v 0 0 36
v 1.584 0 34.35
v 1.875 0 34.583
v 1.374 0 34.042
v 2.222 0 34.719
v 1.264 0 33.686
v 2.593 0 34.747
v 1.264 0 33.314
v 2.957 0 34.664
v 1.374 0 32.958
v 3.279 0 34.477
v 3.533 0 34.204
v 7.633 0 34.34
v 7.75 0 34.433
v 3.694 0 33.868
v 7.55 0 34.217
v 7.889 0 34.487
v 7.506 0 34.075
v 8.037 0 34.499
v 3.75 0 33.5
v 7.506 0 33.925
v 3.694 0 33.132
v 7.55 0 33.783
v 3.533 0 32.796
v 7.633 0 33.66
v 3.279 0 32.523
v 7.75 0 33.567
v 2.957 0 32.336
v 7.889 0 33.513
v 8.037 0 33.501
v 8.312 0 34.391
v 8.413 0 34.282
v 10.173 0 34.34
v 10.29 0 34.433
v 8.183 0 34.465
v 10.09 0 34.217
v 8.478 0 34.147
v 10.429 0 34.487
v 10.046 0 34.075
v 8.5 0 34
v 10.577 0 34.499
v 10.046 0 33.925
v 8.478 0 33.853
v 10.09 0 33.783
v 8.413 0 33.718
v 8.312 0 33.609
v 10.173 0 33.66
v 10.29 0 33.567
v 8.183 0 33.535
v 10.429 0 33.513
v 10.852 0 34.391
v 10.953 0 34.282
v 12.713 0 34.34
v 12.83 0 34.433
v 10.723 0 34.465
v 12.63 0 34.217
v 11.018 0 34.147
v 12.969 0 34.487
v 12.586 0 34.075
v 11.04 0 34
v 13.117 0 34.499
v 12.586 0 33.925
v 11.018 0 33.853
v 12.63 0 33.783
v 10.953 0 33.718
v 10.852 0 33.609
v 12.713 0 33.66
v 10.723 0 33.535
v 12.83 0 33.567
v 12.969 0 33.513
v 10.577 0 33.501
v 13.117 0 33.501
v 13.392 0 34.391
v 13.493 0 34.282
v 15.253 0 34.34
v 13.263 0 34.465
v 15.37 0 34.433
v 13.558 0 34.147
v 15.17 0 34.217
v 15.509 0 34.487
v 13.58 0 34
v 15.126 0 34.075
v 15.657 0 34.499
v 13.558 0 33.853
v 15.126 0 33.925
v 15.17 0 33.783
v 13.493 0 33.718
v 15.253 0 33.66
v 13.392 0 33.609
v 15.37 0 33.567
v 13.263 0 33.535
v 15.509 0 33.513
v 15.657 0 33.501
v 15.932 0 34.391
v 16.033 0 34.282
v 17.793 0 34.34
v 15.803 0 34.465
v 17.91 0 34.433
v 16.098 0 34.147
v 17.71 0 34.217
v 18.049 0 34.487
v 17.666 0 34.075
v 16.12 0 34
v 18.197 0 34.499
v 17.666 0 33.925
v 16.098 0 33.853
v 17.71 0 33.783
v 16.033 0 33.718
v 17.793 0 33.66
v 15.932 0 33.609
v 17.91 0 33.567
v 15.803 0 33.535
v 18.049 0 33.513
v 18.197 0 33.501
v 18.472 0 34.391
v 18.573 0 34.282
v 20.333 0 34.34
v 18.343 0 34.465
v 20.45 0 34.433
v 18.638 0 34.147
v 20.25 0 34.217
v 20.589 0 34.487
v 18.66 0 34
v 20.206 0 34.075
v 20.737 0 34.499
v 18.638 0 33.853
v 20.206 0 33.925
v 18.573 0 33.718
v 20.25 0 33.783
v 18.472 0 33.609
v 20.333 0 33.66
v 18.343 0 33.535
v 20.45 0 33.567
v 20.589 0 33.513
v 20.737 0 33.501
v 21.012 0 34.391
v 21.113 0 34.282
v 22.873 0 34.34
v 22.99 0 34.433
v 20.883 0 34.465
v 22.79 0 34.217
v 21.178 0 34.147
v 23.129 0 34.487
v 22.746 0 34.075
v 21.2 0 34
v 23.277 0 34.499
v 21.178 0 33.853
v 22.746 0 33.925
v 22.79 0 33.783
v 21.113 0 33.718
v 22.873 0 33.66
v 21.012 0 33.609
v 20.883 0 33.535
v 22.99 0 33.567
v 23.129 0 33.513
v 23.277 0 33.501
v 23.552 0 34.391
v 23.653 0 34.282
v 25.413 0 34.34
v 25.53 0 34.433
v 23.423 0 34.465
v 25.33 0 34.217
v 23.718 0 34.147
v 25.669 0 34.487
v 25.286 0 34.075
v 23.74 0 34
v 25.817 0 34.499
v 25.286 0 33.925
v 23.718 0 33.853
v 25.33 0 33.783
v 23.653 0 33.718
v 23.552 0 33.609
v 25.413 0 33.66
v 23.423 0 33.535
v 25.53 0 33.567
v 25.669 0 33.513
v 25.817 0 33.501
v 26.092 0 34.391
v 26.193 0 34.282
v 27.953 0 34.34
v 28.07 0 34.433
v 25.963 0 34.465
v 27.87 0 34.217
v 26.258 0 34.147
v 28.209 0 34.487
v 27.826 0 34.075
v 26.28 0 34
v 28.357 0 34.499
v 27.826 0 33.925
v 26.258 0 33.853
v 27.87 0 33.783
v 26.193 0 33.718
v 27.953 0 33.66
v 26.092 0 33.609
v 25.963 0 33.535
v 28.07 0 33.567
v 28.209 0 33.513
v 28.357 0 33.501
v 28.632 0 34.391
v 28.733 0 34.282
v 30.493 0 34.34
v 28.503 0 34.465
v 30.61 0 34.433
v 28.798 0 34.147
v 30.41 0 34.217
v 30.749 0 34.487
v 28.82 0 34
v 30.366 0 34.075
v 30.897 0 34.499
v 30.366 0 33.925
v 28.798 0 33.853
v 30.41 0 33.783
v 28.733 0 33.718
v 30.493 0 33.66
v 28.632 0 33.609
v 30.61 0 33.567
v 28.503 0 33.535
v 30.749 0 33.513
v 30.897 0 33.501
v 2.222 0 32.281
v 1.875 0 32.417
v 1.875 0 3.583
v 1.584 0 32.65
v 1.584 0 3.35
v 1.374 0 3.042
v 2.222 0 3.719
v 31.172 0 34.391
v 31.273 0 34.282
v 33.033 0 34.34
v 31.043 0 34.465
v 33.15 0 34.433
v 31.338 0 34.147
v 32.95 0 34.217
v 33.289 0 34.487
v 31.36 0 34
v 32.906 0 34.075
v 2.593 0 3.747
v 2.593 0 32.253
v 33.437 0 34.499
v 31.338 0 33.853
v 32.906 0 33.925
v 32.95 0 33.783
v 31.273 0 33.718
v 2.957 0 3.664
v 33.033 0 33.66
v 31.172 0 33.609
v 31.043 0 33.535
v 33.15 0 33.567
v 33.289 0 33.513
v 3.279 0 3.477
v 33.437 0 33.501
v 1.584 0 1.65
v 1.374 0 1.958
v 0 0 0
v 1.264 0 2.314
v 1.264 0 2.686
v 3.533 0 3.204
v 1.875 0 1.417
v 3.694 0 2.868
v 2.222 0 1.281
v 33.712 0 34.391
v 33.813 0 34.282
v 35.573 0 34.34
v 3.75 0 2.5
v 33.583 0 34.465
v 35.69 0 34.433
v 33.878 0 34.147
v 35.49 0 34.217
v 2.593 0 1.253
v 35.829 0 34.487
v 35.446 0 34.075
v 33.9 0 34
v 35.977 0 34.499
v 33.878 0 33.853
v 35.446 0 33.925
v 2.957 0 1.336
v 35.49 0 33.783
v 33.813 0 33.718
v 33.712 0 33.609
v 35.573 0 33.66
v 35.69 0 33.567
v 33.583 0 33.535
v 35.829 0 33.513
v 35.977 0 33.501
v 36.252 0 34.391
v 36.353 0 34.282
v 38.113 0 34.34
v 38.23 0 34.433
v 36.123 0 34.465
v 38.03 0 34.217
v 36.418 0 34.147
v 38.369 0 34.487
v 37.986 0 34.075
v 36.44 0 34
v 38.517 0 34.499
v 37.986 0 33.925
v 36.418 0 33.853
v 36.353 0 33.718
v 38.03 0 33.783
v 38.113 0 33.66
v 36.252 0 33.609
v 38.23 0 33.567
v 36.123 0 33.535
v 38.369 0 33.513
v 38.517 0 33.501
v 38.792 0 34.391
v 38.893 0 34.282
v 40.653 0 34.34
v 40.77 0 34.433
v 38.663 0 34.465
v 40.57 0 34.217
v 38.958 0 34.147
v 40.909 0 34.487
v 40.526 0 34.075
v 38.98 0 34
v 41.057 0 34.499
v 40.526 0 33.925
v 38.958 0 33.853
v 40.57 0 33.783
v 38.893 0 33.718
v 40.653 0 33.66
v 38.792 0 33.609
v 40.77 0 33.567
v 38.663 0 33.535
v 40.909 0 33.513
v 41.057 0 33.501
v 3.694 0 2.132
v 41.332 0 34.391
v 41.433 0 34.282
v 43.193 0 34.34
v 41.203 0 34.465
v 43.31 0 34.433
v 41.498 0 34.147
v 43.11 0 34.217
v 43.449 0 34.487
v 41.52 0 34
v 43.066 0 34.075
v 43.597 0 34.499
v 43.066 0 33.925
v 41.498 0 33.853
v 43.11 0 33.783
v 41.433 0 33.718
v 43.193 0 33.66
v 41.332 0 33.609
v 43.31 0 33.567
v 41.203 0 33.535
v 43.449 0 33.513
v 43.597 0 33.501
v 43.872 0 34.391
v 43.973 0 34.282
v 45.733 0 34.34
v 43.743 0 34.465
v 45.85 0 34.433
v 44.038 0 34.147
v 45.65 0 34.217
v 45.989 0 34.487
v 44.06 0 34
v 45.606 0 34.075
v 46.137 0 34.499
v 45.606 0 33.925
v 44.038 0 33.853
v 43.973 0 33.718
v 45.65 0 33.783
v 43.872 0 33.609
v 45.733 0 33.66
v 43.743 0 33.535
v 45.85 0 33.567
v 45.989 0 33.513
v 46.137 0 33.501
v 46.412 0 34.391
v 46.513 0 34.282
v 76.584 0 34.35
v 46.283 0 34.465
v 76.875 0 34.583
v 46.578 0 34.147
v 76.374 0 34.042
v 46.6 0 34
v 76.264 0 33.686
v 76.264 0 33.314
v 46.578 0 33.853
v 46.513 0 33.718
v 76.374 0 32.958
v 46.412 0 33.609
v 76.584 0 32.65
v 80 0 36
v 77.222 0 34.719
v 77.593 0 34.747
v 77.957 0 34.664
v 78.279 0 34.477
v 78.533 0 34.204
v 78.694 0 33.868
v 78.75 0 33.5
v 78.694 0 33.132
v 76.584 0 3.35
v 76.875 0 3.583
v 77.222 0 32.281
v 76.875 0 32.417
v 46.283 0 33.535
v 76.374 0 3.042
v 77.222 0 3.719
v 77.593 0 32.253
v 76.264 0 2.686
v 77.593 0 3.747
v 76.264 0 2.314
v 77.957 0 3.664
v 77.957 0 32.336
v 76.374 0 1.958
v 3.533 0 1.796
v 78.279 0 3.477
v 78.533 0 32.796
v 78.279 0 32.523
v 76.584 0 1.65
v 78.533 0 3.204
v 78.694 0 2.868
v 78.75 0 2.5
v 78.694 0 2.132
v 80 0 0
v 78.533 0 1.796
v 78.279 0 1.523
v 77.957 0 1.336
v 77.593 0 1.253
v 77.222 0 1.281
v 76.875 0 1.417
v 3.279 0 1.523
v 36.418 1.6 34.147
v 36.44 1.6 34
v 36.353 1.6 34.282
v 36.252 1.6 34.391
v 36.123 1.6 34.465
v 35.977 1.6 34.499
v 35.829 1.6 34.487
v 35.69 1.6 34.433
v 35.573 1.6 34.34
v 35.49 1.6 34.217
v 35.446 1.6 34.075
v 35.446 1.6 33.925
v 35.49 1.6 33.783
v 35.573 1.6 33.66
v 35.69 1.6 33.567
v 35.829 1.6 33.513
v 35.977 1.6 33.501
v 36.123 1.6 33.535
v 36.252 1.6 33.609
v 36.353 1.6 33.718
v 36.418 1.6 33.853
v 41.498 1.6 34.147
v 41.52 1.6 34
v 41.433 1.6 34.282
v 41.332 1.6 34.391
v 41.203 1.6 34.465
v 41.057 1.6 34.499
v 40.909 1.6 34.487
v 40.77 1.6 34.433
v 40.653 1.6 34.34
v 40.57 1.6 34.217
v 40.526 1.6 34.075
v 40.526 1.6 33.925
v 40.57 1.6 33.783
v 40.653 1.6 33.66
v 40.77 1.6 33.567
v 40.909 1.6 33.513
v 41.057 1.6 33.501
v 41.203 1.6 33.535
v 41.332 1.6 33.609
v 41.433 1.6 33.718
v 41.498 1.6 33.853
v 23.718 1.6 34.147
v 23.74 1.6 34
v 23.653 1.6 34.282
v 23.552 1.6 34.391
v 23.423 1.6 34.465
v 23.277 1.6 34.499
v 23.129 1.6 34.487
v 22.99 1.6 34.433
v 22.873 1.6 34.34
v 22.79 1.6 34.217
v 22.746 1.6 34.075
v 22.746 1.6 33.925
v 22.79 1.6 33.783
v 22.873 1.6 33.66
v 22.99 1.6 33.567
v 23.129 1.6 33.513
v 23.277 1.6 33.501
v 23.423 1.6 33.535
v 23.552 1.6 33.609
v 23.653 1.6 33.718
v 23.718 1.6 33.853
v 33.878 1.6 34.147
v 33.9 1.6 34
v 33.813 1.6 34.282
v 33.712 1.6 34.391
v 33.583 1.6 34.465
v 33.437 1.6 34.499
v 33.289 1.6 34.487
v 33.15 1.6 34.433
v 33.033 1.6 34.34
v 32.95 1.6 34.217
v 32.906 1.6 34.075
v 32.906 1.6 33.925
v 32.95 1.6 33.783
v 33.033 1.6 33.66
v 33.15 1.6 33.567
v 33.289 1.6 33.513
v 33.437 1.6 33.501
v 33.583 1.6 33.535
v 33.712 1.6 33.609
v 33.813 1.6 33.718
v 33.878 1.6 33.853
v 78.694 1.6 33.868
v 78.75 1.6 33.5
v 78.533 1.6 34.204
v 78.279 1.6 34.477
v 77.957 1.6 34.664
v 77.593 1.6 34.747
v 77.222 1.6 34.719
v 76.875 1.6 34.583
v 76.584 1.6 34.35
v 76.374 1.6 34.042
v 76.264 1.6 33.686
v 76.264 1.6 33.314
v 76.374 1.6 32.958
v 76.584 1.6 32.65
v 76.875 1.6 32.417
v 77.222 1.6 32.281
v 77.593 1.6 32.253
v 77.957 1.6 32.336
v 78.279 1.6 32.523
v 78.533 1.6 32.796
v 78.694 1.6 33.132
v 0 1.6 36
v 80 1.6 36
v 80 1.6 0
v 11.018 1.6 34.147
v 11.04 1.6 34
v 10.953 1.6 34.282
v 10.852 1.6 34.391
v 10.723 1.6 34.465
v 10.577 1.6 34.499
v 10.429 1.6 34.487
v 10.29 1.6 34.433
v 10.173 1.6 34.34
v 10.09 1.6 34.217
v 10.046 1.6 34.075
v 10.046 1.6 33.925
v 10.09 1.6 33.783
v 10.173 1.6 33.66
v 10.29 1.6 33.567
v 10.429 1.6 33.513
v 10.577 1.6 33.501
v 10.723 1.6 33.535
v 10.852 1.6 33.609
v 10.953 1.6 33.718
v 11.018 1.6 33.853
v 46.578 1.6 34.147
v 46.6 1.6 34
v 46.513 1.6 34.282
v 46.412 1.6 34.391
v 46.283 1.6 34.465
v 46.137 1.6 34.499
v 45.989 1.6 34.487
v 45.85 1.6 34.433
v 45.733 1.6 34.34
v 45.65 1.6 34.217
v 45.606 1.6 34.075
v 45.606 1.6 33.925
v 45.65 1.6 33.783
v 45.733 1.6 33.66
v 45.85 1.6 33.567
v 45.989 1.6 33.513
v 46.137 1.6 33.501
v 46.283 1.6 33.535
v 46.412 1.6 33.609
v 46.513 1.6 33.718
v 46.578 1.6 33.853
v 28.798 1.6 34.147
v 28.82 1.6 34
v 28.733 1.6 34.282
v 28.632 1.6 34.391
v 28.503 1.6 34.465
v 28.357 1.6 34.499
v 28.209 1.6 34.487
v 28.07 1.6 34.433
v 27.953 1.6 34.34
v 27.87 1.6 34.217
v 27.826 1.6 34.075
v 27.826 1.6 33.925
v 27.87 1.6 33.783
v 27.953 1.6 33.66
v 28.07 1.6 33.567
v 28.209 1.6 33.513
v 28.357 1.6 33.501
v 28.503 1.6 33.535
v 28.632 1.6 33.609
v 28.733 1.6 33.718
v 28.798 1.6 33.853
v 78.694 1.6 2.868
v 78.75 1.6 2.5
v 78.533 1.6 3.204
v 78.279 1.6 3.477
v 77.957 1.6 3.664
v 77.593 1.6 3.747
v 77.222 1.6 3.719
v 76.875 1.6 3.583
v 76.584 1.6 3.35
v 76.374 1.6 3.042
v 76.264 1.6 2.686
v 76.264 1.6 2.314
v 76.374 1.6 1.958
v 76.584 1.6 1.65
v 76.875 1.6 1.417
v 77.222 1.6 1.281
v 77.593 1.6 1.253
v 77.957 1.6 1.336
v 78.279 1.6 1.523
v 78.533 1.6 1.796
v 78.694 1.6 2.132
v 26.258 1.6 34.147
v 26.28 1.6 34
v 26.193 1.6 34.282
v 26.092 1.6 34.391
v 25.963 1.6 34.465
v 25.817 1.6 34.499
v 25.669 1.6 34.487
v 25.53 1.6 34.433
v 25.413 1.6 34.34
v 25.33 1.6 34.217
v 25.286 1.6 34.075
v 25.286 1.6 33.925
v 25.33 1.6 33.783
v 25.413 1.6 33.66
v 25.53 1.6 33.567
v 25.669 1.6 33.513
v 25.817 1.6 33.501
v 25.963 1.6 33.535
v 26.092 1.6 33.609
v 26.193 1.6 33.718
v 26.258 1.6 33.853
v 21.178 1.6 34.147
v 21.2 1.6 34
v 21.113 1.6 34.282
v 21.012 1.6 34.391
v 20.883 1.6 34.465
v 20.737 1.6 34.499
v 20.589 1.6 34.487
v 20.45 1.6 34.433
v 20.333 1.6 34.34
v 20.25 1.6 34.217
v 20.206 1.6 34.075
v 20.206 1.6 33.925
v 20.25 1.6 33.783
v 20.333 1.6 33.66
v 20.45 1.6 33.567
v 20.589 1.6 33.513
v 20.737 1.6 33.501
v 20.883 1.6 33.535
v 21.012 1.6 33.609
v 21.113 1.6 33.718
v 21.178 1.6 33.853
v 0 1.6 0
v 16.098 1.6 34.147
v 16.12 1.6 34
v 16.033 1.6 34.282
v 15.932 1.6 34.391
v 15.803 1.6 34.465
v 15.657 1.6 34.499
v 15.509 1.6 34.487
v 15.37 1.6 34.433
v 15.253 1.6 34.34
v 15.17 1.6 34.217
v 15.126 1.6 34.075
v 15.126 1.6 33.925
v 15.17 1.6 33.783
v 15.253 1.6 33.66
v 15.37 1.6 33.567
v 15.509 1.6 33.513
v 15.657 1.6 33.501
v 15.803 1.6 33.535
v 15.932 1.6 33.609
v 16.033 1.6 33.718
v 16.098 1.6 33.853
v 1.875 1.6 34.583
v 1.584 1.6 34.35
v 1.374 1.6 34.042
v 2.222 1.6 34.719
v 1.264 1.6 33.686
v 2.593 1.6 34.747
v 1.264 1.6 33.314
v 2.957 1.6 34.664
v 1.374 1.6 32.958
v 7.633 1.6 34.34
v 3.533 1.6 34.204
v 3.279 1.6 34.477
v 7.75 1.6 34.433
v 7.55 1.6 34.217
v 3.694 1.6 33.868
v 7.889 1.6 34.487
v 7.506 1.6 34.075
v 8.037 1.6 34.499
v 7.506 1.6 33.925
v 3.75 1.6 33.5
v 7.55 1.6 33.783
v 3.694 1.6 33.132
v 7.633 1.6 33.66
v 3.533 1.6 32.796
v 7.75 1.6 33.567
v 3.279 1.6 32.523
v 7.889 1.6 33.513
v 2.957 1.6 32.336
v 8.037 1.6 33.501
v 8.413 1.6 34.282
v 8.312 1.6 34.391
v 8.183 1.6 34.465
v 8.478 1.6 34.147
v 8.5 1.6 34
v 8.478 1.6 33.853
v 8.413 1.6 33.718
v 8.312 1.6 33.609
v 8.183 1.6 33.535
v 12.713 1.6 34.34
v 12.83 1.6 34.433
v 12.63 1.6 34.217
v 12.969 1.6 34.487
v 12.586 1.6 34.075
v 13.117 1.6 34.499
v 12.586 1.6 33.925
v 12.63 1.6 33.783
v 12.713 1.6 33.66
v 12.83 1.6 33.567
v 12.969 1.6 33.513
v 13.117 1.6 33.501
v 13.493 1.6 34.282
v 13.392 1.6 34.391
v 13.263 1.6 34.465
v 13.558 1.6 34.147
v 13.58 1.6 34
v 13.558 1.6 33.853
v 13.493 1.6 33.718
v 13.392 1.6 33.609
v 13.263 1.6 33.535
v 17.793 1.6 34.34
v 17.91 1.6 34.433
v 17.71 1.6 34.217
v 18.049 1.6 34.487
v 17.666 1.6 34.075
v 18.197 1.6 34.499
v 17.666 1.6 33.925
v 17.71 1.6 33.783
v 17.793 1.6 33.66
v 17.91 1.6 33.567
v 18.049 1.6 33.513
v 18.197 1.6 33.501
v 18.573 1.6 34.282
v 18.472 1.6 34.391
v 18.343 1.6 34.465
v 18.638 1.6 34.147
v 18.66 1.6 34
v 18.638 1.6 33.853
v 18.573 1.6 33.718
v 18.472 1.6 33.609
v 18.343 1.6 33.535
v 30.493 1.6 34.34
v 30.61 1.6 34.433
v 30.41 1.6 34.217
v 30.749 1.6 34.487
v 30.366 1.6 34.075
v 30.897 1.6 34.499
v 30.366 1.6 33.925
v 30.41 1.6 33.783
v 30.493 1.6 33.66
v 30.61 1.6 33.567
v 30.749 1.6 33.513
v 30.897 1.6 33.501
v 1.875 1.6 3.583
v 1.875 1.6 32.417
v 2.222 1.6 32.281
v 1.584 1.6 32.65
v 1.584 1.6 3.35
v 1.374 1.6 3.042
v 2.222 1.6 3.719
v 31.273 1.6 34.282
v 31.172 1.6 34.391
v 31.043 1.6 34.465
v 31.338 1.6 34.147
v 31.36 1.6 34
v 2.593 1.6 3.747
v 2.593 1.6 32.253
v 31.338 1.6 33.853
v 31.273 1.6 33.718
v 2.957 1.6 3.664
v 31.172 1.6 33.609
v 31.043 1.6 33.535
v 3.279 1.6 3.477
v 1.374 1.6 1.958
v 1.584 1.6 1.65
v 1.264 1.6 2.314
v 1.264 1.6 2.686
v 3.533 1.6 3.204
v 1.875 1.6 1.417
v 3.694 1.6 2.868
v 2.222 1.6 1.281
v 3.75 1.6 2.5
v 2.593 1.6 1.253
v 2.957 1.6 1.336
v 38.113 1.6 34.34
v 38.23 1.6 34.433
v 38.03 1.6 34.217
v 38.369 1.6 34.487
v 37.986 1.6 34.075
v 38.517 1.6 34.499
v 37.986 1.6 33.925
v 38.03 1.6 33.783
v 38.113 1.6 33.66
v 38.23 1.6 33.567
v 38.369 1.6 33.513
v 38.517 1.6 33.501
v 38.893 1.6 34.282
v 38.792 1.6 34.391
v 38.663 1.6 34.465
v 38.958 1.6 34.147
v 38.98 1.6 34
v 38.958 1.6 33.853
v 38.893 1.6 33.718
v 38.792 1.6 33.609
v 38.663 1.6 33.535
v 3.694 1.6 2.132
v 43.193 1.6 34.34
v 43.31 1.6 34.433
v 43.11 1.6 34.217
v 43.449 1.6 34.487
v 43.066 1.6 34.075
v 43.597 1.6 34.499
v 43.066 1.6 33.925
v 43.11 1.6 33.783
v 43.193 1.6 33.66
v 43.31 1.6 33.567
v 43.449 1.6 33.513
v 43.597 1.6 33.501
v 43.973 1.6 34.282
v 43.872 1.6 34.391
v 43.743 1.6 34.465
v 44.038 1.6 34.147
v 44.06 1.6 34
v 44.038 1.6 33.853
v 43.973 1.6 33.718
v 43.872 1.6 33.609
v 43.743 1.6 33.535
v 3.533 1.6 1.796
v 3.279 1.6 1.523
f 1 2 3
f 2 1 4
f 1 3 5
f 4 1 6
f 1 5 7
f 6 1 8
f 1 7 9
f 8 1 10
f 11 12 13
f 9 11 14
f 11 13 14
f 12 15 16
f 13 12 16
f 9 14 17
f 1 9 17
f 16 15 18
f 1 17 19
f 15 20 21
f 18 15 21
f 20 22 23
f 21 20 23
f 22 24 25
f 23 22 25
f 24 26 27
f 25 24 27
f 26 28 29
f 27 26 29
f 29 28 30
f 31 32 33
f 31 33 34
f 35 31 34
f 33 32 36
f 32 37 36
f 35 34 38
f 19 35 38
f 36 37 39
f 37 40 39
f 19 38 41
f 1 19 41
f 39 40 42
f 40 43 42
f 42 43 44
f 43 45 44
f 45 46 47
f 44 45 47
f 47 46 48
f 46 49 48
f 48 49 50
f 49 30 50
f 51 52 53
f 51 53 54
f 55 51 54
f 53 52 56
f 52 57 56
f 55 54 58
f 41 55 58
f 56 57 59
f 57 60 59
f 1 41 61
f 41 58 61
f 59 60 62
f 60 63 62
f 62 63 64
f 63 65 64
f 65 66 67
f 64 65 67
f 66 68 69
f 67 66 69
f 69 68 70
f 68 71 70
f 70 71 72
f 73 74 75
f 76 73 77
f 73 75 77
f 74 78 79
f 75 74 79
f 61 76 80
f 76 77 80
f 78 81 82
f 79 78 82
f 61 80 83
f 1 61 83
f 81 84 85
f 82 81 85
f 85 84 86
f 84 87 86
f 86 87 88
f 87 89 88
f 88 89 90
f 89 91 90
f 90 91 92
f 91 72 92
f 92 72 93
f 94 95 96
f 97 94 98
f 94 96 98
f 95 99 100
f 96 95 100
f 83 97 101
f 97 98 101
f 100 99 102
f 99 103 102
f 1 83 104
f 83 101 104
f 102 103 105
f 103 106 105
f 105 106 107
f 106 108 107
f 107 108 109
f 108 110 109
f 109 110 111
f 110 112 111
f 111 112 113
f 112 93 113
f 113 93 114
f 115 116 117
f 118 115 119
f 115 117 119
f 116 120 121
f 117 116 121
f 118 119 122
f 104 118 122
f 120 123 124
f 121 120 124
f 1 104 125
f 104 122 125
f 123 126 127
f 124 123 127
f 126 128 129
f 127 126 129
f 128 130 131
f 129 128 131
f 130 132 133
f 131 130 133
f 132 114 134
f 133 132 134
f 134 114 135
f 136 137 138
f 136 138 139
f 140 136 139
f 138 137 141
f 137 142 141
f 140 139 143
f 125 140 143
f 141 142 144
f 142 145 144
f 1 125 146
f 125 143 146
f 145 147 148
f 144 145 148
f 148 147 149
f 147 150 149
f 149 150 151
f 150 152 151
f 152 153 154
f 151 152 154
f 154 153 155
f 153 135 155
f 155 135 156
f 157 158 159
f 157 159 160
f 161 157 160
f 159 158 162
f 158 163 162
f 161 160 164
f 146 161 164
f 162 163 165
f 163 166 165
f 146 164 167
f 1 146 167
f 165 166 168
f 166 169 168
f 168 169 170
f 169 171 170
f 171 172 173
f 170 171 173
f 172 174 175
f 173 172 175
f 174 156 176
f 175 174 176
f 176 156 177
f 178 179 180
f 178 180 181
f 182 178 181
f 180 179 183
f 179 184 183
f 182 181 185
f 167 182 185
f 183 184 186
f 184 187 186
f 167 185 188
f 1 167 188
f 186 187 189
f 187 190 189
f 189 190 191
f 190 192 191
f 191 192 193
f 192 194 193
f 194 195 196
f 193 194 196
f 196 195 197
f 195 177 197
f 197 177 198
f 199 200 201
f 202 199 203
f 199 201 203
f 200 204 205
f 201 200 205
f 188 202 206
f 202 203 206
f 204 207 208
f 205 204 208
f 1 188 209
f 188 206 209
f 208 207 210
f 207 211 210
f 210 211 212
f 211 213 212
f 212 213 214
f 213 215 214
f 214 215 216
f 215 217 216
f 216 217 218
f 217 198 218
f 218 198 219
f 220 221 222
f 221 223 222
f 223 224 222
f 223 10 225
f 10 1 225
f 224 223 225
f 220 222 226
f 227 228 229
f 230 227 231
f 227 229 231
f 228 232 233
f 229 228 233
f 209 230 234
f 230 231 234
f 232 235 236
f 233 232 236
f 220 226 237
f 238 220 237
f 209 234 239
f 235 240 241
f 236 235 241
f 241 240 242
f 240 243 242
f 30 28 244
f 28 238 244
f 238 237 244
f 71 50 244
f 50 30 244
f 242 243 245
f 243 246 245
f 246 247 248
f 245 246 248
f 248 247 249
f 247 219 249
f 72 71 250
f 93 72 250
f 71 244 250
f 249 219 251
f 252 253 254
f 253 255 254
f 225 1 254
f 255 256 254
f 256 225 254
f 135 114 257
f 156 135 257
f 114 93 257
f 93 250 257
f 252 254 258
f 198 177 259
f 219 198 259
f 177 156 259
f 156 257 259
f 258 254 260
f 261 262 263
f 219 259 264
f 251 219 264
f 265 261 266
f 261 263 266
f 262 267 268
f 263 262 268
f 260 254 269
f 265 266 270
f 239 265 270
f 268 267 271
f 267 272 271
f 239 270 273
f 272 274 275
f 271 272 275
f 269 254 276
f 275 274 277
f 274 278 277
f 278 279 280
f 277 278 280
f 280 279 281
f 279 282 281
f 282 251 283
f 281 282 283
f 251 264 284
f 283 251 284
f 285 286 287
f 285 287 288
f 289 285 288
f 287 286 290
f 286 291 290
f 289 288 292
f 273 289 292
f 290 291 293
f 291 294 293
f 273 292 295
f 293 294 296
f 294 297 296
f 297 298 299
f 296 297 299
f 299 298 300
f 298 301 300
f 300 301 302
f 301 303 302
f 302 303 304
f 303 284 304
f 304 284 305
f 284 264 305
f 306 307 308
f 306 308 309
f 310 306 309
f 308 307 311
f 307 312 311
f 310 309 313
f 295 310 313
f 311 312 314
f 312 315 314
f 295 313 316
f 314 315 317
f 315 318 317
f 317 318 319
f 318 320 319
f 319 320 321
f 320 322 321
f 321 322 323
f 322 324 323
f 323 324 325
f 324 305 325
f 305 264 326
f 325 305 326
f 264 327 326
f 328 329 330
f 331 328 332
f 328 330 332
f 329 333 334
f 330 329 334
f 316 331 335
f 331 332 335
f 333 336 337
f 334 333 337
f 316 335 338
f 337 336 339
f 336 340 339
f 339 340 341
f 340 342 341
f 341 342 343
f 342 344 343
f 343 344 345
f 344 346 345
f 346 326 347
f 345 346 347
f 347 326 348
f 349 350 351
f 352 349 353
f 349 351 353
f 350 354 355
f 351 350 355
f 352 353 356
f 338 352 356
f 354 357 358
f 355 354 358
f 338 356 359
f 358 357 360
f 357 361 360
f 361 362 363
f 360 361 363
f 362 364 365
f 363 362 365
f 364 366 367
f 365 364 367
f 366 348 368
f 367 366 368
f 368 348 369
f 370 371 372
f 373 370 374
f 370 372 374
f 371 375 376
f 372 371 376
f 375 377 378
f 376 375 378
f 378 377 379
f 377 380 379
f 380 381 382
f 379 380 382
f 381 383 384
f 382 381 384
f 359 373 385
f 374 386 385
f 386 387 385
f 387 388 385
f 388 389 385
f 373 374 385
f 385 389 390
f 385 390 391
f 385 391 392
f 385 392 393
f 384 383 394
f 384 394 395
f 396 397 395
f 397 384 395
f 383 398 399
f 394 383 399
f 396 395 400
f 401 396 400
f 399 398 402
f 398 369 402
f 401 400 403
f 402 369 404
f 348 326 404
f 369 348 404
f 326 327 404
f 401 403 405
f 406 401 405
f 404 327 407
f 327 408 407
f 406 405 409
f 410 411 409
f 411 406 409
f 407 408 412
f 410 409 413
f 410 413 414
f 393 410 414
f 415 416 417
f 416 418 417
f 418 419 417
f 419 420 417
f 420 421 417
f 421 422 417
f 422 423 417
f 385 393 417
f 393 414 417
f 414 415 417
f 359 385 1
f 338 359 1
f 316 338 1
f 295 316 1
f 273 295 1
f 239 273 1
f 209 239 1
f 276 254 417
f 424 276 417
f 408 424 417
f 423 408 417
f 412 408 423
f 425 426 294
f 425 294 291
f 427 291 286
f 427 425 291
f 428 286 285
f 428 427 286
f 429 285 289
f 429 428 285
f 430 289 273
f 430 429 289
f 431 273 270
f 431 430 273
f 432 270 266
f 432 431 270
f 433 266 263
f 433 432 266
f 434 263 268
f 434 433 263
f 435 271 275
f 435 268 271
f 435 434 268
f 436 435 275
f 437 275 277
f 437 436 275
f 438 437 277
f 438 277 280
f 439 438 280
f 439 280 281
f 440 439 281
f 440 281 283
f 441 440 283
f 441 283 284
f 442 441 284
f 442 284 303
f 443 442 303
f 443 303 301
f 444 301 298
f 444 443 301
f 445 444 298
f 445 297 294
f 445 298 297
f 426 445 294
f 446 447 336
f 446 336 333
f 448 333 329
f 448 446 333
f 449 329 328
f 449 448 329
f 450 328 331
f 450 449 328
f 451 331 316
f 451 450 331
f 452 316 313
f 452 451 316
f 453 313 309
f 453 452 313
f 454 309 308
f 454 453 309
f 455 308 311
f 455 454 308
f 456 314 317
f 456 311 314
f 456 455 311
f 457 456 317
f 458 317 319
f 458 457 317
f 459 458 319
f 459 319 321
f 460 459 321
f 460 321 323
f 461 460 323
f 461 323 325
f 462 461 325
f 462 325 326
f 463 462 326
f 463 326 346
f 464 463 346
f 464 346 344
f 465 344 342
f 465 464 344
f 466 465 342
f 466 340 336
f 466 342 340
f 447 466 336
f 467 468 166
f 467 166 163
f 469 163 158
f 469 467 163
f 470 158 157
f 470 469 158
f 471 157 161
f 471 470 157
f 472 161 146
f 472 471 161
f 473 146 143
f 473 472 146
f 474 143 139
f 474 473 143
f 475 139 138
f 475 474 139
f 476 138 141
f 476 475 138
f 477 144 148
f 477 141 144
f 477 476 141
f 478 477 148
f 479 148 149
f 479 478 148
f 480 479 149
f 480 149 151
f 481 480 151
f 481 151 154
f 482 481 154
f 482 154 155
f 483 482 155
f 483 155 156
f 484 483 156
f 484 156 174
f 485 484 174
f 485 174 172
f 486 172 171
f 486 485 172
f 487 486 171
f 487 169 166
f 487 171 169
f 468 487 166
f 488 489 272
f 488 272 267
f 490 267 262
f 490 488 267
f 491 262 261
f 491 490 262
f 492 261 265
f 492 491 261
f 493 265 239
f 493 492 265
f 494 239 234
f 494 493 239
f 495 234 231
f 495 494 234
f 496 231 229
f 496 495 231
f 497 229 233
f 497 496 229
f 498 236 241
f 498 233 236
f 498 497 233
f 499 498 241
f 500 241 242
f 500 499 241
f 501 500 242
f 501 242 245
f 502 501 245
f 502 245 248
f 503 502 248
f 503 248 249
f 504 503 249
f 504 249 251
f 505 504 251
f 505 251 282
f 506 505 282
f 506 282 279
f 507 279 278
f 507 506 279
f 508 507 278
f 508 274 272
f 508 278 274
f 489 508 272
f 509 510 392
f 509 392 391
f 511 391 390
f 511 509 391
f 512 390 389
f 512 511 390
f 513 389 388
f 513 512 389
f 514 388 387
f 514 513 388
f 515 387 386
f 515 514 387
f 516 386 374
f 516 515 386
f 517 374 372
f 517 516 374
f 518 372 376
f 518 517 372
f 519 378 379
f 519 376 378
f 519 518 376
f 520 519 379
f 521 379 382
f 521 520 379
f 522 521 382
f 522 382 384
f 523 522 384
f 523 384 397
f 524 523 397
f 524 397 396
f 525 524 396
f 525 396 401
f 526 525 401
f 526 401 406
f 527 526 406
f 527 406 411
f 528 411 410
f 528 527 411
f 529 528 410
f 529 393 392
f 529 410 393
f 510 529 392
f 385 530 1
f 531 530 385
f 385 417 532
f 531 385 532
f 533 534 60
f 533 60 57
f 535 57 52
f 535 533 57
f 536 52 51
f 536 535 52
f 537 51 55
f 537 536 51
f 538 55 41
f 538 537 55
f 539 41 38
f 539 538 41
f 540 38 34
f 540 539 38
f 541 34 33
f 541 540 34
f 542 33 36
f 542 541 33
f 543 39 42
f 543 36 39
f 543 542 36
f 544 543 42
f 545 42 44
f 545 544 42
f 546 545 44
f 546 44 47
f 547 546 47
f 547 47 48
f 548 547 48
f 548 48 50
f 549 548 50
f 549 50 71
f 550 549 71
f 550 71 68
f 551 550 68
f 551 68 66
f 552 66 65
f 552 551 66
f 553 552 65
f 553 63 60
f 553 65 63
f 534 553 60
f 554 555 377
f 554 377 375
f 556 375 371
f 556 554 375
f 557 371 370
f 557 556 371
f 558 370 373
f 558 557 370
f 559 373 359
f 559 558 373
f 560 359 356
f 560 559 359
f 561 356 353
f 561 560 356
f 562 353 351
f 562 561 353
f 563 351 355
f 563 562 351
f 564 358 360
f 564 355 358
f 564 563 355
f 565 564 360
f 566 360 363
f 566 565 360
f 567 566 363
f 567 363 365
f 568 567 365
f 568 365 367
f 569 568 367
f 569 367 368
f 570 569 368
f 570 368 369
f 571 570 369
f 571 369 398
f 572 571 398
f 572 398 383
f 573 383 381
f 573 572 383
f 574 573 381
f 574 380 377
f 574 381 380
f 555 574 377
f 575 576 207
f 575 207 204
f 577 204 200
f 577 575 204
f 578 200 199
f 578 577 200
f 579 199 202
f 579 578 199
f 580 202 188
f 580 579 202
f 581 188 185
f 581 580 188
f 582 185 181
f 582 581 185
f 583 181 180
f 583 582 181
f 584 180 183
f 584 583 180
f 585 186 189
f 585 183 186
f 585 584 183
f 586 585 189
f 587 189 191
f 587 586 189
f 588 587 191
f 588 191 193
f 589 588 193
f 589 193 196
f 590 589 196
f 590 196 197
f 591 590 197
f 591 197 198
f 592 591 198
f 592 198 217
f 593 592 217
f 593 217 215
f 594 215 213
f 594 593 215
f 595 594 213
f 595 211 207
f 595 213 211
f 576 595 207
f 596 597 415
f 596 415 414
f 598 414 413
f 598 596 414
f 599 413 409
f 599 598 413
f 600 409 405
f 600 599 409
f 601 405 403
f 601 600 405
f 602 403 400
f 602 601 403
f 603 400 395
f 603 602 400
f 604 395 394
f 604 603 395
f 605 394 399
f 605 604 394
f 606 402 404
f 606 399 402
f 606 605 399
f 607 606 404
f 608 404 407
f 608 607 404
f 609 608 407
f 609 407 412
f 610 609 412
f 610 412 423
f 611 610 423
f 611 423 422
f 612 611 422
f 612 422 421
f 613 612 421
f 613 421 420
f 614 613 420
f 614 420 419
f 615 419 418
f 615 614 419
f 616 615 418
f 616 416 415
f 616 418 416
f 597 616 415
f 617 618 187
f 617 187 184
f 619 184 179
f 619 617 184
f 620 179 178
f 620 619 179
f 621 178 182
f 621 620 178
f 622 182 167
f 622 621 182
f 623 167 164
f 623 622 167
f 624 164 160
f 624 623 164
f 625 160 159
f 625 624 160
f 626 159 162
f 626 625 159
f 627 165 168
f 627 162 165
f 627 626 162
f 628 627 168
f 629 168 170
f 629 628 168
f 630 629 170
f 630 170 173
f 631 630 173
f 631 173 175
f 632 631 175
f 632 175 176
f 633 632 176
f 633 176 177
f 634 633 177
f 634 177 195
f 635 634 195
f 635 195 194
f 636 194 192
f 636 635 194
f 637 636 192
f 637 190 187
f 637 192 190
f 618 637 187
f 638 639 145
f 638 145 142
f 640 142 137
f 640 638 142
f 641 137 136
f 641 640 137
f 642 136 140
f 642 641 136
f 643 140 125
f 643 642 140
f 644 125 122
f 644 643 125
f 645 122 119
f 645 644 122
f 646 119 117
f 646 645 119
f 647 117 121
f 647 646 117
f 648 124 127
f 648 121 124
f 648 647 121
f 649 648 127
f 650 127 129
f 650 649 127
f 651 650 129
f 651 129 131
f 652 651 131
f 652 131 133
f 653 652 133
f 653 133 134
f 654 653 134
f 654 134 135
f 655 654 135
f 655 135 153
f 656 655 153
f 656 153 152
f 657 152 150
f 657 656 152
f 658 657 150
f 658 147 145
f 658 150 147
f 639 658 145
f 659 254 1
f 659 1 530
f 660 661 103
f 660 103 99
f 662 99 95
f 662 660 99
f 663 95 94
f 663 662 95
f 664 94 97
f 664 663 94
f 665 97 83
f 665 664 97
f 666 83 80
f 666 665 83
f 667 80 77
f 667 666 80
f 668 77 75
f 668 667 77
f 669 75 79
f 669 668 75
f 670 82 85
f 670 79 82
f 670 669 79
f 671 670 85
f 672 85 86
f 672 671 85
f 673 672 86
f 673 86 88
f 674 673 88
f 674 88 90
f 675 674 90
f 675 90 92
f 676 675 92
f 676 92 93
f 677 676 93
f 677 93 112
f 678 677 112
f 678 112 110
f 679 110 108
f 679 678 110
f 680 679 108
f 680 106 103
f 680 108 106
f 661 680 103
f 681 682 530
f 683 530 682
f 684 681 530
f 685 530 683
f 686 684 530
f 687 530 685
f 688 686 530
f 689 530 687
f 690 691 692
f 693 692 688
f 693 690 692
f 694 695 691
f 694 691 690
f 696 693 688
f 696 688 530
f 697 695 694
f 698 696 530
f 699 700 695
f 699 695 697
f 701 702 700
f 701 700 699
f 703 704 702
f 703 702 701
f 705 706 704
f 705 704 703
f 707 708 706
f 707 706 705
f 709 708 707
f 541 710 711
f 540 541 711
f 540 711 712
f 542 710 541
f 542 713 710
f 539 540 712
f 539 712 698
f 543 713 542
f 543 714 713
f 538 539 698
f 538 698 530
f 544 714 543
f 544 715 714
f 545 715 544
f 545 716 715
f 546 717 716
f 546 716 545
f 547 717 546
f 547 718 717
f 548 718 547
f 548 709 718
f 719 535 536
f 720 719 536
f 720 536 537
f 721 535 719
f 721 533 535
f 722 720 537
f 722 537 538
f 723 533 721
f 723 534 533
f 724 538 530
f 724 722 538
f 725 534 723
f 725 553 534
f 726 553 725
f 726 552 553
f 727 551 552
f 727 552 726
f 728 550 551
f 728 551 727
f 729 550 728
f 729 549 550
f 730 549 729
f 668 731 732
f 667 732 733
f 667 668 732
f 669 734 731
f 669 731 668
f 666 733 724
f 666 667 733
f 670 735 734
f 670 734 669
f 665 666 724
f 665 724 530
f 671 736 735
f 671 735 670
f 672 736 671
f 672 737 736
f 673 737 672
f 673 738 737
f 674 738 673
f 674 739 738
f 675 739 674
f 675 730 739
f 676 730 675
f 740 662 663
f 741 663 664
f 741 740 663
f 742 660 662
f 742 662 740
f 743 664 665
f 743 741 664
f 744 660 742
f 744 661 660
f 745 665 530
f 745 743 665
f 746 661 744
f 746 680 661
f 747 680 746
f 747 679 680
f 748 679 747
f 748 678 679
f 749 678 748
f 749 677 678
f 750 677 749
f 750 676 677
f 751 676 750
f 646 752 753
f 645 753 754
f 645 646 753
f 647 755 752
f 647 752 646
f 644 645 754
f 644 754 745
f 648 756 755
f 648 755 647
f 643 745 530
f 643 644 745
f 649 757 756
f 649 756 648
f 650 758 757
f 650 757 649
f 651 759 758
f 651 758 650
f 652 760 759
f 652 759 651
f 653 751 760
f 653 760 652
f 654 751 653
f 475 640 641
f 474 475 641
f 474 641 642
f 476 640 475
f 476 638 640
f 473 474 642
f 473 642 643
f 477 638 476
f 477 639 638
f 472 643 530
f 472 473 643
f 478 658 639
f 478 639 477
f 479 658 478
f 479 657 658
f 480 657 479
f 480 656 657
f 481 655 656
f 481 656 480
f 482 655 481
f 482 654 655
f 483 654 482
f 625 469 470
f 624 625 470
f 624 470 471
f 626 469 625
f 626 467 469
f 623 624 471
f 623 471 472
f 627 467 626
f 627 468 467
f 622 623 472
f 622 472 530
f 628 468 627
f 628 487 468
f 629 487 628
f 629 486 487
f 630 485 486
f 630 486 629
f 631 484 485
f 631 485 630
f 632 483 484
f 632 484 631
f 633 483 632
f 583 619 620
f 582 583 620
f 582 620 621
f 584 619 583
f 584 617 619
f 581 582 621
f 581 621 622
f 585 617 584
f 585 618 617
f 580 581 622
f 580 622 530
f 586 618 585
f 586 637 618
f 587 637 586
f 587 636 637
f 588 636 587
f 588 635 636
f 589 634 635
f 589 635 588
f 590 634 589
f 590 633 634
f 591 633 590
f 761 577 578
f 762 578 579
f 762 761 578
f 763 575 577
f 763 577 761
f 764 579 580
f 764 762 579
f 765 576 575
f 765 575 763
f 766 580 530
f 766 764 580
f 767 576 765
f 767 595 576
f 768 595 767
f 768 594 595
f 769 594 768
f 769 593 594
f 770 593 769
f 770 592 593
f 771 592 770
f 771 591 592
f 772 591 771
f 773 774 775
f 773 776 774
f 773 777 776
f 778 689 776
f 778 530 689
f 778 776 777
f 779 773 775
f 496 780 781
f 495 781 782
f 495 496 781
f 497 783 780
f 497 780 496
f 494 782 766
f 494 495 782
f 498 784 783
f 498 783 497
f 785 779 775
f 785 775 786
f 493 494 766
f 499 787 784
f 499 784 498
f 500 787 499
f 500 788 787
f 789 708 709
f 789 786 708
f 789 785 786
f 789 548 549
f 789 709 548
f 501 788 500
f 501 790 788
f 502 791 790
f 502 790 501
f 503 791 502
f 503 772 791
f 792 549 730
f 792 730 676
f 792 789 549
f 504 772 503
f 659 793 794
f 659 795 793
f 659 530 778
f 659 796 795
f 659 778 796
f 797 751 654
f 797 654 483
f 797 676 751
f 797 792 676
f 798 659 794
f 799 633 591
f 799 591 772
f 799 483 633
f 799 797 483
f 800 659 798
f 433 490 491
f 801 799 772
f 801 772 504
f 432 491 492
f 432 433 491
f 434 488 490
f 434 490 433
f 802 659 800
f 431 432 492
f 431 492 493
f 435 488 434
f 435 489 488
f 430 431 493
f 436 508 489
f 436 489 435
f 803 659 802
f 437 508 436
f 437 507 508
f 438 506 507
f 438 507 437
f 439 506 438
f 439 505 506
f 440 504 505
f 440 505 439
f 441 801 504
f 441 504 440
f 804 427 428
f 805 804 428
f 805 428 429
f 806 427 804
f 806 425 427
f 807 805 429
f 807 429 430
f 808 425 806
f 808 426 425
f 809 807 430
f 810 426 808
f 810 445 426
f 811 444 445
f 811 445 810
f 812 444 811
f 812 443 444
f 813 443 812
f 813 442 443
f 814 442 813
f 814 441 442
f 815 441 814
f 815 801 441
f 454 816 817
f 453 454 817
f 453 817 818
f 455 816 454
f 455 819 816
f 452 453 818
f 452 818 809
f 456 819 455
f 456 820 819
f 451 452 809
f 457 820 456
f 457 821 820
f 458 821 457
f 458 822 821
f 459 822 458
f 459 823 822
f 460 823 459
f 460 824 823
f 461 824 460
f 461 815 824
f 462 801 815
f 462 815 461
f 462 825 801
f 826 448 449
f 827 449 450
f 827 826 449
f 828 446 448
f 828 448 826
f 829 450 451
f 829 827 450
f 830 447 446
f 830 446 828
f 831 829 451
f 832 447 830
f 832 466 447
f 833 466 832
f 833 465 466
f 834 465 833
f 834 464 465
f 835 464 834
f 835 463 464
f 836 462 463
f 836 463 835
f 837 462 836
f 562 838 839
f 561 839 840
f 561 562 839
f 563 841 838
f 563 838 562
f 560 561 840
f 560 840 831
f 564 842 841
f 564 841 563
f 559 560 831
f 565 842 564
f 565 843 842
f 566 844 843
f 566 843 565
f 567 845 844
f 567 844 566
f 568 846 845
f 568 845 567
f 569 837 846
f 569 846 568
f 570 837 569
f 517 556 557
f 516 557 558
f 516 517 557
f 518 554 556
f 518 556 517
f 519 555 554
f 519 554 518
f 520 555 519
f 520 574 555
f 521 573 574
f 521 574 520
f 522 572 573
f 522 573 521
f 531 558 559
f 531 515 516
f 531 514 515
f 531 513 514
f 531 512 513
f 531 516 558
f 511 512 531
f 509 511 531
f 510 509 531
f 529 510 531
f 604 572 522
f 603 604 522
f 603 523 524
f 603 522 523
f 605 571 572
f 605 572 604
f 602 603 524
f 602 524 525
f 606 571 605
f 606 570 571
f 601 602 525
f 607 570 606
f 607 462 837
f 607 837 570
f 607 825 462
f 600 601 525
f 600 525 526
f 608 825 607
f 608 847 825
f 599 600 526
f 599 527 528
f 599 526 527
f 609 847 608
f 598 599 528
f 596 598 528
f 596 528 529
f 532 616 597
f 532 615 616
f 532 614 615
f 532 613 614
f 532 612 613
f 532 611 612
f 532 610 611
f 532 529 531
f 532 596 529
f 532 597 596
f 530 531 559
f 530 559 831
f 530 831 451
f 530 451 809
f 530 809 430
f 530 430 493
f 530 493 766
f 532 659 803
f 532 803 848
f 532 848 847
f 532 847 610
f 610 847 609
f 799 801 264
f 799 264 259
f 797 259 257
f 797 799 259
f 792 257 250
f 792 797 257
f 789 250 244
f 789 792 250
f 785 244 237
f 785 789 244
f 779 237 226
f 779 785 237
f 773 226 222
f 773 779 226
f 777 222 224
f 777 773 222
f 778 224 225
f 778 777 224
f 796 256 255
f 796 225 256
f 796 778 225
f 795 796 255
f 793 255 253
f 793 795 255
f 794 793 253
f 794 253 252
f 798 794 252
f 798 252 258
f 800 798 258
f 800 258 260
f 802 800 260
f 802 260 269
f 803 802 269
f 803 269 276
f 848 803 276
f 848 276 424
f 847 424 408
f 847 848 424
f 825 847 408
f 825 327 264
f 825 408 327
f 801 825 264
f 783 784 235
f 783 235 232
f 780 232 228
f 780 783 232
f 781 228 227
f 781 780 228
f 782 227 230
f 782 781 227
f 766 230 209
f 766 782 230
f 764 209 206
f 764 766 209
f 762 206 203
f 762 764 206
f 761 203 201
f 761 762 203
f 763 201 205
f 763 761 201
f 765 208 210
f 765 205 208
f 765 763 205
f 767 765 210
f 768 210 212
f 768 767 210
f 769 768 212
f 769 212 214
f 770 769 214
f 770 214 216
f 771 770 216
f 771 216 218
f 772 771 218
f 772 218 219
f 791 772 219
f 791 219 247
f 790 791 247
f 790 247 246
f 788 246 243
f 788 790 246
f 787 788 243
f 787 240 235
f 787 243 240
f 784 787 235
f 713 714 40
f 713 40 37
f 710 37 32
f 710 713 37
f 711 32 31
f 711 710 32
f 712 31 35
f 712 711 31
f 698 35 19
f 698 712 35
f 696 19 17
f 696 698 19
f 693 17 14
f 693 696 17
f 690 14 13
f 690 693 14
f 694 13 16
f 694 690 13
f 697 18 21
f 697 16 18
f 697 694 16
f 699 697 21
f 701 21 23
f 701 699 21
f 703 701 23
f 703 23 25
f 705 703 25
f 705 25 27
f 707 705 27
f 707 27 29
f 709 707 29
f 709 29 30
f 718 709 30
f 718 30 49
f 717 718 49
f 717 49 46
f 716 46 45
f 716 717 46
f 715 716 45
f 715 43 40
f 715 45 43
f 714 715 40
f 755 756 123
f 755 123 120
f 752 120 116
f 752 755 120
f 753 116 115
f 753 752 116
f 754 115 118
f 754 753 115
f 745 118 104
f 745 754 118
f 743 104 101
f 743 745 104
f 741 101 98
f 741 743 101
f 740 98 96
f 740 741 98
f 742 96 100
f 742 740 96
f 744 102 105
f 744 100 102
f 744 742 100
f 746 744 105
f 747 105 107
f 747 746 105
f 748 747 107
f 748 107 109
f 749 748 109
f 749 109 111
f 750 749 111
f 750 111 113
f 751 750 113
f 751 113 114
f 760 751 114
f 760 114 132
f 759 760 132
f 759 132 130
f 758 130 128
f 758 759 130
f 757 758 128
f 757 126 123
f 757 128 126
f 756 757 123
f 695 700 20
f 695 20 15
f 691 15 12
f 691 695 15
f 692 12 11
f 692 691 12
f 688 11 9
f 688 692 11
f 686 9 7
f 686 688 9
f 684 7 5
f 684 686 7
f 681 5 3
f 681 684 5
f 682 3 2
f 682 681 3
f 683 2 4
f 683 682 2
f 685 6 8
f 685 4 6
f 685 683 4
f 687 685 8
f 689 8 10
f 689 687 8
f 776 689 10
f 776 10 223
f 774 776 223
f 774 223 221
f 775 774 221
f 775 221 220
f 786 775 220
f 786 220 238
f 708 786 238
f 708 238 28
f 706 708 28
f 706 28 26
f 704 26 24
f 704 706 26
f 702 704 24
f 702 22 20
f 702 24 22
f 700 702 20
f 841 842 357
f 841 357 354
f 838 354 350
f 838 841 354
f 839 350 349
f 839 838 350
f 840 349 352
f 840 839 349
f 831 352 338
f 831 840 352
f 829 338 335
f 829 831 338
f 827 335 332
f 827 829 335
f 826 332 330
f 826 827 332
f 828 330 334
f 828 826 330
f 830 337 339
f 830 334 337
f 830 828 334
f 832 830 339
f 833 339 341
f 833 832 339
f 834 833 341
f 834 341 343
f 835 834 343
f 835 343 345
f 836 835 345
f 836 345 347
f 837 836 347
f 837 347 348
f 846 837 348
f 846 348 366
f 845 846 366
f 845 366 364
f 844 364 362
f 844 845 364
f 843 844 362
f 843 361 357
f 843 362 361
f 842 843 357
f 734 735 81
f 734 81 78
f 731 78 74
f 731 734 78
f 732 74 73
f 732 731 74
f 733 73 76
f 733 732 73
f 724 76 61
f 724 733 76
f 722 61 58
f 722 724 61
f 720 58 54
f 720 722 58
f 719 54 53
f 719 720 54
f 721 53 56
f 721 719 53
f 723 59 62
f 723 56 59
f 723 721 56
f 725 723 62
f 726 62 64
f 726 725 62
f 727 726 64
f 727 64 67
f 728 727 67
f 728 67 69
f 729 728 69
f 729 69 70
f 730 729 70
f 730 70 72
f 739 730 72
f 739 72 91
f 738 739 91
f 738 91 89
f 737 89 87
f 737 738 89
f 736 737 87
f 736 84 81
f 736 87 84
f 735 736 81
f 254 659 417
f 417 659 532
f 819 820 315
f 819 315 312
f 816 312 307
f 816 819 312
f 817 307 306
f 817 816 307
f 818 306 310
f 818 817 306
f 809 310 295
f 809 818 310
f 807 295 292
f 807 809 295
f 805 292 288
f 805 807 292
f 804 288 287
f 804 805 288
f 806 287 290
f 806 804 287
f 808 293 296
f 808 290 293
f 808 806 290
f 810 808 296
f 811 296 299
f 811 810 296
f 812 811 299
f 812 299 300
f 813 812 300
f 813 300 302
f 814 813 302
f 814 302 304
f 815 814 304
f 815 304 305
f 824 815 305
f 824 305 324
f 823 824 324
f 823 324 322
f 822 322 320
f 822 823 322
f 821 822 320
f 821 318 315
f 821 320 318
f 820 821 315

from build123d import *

# Parameters (mm, degrees)
CYLINDER010_R     = 0.5
CYLINDER010_DEPTH = 2
ARRAY004_X_COUNT  = 16
ARRAY004_X_PITCH  = 2.54
CYLINDER009_R     = 1.25
CYLINDER009_DEPTH = 2
ARRAY003_X_COUNT  = 2
ARRAY003_X_PITCH  = 75
ARRAY003_Z_COUNT  = 2
ARRAY003_Z_PITCH  = 31
BOX015_W          = 80
BOX015_H          = 1.6
BOX015_DEPTH      = 36


with BuildPart() as array004:
    # Cylinder010 → Cylinder010 (new body)
    with BuildSketch(Plane(origin=(8, 1.8, 34), x_dir=(1, 0, 0), z_dir=(0, -1, 0))):
        Circle(CYLINDER010_R)
    extrude(amount=CYLINDER010_DEPTH)

    # Array004 X: Array004 ×16


with BuildPart() as array004_1:
    add(array004.part)
    with Locations(*[(i * ARRAY004_X_PITCH, 0, 0) for i in range(1, ARRAY004_X_COUNT)]):
        add(array004.part)


with BuildPart() as array:
    # Cylinder009 → Cylinder009 (new body)
    with BuildSketch(Plane(origin=(2.5, 1.8, 2.5), x_dir=(1, 0, 0), z_dir=(0, -1, 0))):
        Circle(CYLINDER009_R)
    extrude(amount=CYLINDER009_DEPTH)

    # Array003 X: Array ×2


with BuildPart() as array_1:
    add(array.part)
    with Locations(*[(i * ARRAY003_X_PITCH, 0, 0) for i in range(1, ARRAY003_X_COUNT)]):
        add(array.part)

    # Array003 Z: Array ×2


with BuildPart() as array_2:
    add(array_1.part)
    with Locations(*[(0, 0, i * ARRAY003_Z_PITCH) for i in range(1, ARRAY003_Z_COUNT)]):
        add(array_1.part)


with BuildPart() as pcb:
    # Box015 → Box015 (new body)
    with BuildSketch(Plane.XY):
        with Locations((40, 0.8)):
            Rectangle(BOX015_W, BOX015_H)
    extrude(amount=BOX015_DEPTH)

    # Cut001: cut Array
    add(array_2.part, mode=Mode.SUBTRACT)

    # Cut002: cut Array004
    add(array004_1.part, mode=Mode.SUBTRACT)


solid = pcb.part
